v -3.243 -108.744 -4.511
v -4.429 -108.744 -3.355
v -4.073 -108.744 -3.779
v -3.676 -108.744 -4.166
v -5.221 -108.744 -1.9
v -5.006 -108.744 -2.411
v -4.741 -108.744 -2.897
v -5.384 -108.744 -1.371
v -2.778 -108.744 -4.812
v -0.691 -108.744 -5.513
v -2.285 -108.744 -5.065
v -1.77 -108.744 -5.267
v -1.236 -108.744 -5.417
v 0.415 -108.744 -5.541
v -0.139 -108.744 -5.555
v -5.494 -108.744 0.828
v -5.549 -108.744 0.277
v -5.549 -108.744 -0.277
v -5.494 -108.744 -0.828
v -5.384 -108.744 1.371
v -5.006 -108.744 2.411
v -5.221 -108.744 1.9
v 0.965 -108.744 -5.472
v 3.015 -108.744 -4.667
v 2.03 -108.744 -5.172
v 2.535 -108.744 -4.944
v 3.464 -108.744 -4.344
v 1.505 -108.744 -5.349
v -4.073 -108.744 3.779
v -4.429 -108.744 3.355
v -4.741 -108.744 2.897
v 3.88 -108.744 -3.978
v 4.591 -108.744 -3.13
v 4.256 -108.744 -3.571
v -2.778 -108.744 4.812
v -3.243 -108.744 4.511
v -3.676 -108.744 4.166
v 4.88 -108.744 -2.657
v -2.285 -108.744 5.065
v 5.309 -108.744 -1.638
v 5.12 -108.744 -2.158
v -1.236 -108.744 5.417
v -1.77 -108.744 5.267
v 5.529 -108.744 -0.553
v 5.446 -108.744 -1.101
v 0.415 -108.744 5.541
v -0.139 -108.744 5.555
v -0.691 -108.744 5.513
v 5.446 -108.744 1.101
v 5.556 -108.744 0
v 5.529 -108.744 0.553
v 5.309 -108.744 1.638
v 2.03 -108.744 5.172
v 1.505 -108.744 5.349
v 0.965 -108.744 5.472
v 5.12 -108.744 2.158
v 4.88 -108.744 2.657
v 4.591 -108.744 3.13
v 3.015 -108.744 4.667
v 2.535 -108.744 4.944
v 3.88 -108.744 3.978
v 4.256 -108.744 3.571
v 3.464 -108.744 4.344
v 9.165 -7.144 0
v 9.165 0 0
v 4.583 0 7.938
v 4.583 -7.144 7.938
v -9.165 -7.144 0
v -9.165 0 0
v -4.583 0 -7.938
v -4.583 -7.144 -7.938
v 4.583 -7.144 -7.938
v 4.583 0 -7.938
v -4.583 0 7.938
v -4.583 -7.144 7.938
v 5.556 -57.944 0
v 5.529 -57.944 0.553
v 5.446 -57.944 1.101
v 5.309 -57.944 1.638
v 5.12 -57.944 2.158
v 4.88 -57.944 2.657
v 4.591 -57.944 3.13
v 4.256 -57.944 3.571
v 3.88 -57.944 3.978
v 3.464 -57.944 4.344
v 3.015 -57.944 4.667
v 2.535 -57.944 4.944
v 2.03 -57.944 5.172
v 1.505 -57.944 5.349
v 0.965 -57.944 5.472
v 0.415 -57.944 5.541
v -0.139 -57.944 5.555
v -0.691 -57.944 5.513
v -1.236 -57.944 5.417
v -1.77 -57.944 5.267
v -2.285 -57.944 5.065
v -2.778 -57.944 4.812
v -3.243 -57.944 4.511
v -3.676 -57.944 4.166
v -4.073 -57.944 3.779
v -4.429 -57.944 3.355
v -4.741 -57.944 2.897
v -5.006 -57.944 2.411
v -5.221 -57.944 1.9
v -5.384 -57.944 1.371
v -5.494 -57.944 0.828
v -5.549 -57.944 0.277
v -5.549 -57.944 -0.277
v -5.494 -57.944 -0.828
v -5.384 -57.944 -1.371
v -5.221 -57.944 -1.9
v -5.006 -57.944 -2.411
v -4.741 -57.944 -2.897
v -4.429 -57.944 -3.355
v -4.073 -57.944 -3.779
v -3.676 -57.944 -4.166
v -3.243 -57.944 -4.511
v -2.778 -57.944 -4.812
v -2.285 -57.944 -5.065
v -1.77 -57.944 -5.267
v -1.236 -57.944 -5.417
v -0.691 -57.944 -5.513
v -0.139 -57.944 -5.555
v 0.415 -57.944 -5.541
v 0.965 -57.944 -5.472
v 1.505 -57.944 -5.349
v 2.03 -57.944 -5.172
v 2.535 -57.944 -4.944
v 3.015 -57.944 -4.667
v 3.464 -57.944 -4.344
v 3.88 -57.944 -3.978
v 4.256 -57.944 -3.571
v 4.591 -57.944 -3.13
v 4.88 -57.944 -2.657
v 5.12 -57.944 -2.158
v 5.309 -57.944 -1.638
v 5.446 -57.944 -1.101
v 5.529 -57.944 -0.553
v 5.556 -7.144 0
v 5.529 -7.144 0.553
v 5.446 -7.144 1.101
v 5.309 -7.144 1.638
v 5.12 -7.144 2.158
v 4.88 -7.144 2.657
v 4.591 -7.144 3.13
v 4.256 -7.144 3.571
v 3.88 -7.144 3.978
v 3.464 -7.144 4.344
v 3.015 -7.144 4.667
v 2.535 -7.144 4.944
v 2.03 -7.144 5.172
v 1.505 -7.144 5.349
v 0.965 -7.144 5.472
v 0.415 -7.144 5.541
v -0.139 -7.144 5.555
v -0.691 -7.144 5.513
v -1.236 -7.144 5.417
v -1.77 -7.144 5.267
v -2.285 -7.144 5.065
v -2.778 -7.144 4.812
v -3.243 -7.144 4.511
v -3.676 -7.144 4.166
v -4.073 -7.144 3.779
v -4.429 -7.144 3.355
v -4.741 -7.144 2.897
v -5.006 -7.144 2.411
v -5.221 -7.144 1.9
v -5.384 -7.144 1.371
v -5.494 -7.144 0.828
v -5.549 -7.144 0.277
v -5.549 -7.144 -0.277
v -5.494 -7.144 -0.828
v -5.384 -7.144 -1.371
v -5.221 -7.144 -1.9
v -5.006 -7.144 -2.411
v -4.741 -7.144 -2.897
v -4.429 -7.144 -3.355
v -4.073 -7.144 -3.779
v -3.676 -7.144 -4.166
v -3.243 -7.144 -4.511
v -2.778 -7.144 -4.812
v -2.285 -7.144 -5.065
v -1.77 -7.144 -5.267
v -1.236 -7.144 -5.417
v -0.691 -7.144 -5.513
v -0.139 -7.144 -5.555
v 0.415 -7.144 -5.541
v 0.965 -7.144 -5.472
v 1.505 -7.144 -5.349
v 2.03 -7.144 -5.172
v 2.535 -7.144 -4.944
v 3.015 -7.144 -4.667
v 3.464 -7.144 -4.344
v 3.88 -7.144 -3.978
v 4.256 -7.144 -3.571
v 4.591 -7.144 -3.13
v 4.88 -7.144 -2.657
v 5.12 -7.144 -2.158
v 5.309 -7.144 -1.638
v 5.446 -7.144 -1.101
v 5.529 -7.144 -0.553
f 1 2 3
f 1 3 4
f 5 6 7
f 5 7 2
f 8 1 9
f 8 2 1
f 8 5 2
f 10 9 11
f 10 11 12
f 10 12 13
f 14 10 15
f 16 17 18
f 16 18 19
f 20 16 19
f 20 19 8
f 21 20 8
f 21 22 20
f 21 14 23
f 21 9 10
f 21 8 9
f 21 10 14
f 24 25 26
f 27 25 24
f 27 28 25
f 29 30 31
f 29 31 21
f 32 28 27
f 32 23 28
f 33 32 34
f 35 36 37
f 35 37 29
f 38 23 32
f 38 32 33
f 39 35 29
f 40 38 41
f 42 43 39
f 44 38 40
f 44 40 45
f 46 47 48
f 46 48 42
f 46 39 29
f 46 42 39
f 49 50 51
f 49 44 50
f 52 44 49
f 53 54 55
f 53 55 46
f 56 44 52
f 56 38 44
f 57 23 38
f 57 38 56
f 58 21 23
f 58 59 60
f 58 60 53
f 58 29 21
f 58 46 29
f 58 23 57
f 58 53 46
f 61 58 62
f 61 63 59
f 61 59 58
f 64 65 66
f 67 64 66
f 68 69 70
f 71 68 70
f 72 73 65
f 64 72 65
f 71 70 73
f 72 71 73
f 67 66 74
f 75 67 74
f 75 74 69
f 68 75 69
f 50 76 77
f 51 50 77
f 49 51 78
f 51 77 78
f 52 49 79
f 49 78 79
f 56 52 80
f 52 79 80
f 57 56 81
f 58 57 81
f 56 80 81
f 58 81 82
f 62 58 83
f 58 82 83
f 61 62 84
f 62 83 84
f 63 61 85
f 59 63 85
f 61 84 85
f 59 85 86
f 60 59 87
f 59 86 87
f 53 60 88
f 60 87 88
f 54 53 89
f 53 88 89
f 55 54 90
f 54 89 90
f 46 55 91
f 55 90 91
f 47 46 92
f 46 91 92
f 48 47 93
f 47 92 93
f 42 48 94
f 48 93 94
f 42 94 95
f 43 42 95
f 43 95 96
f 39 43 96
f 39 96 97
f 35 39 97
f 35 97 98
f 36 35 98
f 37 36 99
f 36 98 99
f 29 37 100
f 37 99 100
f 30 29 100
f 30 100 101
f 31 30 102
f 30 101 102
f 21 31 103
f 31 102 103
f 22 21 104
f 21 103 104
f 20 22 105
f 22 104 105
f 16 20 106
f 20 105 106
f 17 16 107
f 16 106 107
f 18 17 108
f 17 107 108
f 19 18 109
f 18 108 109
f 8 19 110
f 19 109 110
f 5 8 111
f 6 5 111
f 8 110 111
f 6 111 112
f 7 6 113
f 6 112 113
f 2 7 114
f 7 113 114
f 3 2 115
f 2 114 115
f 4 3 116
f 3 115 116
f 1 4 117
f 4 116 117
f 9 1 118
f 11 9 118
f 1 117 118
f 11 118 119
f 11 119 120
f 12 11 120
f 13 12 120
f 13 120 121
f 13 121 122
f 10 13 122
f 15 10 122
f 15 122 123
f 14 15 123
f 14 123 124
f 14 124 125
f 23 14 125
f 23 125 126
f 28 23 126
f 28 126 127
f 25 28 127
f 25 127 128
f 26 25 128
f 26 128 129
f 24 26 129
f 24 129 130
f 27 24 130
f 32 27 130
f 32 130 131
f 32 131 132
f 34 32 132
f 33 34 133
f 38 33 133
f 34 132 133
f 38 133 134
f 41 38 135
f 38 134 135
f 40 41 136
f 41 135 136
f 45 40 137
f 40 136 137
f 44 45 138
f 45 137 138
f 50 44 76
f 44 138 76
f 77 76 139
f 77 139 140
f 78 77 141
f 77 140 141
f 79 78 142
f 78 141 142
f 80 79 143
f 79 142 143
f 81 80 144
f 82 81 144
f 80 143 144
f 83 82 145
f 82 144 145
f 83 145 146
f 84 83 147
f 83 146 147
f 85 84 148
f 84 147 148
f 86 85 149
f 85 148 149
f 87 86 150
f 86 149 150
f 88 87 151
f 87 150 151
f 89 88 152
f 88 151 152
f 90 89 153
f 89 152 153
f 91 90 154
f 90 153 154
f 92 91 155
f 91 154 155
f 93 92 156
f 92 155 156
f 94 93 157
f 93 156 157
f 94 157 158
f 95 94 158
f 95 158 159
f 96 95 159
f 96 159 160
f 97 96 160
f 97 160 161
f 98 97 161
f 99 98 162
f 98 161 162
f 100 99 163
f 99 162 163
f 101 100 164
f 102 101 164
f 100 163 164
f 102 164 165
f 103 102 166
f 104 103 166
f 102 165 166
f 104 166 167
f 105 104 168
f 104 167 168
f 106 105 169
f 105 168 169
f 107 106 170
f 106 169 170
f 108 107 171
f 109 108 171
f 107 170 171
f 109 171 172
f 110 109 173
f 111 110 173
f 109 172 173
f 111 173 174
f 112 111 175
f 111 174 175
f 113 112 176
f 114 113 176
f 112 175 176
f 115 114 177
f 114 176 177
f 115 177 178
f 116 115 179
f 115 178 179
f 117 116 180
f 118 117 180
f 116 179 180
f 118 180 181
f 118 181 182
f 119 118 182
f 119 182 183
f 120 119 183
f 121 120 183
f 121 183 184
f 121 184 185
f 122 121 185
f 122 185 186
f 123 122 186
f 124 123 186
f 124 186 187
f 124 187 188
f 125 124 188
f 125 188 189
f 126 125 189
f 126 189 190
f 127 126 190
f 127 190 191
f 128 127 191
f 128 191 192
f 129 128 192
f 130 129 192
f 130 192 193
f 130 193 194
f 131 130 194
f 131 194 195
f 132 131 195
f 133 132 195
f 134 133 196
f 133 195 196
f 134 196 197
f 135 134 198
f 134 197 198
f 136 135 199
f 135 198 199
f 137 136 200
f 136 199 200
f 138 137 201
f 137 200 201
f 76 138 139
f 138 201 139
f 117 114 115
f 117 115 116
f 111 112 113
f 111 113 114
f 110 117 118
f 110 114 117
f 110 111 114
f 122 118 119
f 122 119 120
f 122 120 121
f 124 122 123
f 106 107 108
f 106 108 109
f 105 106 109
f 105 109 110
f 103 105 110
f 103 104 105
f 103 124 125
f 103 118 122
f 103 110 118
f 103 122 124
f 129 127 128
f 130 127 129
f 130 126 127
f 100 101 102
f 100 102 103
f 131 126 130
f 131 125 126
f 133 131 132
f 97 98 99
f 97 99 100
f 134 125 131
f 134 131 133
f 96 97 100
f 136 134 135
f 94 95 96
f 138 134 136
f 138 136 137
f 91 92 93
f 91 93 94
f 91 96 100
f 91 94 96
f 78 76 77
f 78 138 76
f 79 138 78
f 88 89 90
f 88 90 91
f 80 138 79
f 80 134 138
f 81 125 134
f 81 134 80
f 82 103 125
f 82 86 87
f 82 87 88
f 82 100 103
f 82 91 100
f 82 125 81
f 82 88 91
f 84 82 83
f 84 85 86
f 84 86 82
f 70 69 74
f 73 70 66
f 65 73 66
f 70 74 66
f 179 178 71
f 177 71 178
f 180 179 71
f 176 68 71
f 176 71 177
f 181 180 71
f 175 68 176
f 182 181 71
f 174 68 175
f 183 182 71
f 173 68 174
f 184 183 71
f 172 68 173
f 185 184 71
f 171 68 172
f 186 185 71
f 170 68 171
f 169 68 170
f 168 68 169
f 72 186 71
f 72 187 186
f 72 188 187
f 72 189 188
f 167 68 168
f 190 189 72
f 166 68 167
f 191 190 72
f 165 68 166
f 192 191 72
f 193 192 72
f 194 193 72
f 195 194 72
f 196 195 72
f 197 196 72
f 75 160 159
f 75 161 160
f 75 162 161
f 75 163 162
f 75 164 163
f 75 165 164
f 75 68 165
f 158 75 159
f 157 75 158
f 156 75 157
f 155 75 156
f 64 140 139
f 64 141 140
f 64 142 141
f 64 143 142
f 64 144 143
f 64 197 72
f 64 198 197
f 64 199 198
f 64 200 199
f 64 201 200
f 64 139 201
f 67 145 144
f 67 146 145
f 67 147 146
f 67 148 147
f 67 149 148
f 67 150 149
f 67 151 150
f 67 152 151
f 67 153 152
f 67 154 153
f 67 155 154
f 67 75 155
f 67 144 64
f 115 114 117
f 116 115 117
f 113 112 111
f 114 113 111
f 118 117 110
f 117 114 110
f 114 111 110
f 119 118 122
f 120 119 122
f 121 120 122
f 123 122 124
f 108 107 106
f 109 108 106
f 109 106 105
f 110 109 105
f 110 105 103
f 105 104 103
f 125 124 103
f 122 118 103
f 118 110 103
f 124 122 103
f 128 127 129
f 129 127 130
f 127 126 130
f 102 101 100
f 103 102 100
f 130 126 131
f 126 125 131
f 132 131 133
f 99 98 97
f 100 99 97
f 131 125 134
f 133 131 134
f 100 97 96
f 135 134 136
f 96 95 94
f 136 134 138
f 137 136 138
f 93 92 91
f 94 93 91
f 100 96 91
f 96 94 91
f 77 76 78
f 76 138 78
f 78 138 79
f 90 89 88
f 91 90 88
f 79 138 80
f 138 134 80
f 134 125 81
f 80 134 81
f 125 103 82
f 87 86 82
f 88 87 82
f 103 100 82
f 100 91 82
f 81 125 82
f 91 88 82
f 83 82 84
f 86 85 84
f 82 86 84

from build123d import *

# Parameters (mm, degrees)
F1_DEPTH = 7.14375
F2_R     = 5.55625
F3_DEPTH = 50.8
F4_R     = 5.55625
F5_DEPTH = 50.8


with BuildPart() as f1:
    # F0 (on Front) → F1 (new body)
    with BuildSketch(Plane.XZ):
        Polygon((4.5827177617, 7.9375), (-4.5827177617, 7.9375), (-9.1654355234, 0), (-4.5827177617, -7.9375), (4.5827177617, -7.9375), (9.1654355234, 0), align=None)
    extrude(amount=F1_DEPTH)

    # F2 (on face) → F3 (join)
    with BuildSketch(Plane.XZ.offset(7.14375)):
        Circle(F2_R)
    extrude(amount=F3_DEPTH)


with BuildPart() as f5:
    # F4 (on face) → F5 (new body)
    with BuildSketch(Plane.XZ.offset(57.94375)):
        Circle(F4_R)
    extrude(amount=F5_DEPTH)


solid = Compound([f1.part, f5.part])
